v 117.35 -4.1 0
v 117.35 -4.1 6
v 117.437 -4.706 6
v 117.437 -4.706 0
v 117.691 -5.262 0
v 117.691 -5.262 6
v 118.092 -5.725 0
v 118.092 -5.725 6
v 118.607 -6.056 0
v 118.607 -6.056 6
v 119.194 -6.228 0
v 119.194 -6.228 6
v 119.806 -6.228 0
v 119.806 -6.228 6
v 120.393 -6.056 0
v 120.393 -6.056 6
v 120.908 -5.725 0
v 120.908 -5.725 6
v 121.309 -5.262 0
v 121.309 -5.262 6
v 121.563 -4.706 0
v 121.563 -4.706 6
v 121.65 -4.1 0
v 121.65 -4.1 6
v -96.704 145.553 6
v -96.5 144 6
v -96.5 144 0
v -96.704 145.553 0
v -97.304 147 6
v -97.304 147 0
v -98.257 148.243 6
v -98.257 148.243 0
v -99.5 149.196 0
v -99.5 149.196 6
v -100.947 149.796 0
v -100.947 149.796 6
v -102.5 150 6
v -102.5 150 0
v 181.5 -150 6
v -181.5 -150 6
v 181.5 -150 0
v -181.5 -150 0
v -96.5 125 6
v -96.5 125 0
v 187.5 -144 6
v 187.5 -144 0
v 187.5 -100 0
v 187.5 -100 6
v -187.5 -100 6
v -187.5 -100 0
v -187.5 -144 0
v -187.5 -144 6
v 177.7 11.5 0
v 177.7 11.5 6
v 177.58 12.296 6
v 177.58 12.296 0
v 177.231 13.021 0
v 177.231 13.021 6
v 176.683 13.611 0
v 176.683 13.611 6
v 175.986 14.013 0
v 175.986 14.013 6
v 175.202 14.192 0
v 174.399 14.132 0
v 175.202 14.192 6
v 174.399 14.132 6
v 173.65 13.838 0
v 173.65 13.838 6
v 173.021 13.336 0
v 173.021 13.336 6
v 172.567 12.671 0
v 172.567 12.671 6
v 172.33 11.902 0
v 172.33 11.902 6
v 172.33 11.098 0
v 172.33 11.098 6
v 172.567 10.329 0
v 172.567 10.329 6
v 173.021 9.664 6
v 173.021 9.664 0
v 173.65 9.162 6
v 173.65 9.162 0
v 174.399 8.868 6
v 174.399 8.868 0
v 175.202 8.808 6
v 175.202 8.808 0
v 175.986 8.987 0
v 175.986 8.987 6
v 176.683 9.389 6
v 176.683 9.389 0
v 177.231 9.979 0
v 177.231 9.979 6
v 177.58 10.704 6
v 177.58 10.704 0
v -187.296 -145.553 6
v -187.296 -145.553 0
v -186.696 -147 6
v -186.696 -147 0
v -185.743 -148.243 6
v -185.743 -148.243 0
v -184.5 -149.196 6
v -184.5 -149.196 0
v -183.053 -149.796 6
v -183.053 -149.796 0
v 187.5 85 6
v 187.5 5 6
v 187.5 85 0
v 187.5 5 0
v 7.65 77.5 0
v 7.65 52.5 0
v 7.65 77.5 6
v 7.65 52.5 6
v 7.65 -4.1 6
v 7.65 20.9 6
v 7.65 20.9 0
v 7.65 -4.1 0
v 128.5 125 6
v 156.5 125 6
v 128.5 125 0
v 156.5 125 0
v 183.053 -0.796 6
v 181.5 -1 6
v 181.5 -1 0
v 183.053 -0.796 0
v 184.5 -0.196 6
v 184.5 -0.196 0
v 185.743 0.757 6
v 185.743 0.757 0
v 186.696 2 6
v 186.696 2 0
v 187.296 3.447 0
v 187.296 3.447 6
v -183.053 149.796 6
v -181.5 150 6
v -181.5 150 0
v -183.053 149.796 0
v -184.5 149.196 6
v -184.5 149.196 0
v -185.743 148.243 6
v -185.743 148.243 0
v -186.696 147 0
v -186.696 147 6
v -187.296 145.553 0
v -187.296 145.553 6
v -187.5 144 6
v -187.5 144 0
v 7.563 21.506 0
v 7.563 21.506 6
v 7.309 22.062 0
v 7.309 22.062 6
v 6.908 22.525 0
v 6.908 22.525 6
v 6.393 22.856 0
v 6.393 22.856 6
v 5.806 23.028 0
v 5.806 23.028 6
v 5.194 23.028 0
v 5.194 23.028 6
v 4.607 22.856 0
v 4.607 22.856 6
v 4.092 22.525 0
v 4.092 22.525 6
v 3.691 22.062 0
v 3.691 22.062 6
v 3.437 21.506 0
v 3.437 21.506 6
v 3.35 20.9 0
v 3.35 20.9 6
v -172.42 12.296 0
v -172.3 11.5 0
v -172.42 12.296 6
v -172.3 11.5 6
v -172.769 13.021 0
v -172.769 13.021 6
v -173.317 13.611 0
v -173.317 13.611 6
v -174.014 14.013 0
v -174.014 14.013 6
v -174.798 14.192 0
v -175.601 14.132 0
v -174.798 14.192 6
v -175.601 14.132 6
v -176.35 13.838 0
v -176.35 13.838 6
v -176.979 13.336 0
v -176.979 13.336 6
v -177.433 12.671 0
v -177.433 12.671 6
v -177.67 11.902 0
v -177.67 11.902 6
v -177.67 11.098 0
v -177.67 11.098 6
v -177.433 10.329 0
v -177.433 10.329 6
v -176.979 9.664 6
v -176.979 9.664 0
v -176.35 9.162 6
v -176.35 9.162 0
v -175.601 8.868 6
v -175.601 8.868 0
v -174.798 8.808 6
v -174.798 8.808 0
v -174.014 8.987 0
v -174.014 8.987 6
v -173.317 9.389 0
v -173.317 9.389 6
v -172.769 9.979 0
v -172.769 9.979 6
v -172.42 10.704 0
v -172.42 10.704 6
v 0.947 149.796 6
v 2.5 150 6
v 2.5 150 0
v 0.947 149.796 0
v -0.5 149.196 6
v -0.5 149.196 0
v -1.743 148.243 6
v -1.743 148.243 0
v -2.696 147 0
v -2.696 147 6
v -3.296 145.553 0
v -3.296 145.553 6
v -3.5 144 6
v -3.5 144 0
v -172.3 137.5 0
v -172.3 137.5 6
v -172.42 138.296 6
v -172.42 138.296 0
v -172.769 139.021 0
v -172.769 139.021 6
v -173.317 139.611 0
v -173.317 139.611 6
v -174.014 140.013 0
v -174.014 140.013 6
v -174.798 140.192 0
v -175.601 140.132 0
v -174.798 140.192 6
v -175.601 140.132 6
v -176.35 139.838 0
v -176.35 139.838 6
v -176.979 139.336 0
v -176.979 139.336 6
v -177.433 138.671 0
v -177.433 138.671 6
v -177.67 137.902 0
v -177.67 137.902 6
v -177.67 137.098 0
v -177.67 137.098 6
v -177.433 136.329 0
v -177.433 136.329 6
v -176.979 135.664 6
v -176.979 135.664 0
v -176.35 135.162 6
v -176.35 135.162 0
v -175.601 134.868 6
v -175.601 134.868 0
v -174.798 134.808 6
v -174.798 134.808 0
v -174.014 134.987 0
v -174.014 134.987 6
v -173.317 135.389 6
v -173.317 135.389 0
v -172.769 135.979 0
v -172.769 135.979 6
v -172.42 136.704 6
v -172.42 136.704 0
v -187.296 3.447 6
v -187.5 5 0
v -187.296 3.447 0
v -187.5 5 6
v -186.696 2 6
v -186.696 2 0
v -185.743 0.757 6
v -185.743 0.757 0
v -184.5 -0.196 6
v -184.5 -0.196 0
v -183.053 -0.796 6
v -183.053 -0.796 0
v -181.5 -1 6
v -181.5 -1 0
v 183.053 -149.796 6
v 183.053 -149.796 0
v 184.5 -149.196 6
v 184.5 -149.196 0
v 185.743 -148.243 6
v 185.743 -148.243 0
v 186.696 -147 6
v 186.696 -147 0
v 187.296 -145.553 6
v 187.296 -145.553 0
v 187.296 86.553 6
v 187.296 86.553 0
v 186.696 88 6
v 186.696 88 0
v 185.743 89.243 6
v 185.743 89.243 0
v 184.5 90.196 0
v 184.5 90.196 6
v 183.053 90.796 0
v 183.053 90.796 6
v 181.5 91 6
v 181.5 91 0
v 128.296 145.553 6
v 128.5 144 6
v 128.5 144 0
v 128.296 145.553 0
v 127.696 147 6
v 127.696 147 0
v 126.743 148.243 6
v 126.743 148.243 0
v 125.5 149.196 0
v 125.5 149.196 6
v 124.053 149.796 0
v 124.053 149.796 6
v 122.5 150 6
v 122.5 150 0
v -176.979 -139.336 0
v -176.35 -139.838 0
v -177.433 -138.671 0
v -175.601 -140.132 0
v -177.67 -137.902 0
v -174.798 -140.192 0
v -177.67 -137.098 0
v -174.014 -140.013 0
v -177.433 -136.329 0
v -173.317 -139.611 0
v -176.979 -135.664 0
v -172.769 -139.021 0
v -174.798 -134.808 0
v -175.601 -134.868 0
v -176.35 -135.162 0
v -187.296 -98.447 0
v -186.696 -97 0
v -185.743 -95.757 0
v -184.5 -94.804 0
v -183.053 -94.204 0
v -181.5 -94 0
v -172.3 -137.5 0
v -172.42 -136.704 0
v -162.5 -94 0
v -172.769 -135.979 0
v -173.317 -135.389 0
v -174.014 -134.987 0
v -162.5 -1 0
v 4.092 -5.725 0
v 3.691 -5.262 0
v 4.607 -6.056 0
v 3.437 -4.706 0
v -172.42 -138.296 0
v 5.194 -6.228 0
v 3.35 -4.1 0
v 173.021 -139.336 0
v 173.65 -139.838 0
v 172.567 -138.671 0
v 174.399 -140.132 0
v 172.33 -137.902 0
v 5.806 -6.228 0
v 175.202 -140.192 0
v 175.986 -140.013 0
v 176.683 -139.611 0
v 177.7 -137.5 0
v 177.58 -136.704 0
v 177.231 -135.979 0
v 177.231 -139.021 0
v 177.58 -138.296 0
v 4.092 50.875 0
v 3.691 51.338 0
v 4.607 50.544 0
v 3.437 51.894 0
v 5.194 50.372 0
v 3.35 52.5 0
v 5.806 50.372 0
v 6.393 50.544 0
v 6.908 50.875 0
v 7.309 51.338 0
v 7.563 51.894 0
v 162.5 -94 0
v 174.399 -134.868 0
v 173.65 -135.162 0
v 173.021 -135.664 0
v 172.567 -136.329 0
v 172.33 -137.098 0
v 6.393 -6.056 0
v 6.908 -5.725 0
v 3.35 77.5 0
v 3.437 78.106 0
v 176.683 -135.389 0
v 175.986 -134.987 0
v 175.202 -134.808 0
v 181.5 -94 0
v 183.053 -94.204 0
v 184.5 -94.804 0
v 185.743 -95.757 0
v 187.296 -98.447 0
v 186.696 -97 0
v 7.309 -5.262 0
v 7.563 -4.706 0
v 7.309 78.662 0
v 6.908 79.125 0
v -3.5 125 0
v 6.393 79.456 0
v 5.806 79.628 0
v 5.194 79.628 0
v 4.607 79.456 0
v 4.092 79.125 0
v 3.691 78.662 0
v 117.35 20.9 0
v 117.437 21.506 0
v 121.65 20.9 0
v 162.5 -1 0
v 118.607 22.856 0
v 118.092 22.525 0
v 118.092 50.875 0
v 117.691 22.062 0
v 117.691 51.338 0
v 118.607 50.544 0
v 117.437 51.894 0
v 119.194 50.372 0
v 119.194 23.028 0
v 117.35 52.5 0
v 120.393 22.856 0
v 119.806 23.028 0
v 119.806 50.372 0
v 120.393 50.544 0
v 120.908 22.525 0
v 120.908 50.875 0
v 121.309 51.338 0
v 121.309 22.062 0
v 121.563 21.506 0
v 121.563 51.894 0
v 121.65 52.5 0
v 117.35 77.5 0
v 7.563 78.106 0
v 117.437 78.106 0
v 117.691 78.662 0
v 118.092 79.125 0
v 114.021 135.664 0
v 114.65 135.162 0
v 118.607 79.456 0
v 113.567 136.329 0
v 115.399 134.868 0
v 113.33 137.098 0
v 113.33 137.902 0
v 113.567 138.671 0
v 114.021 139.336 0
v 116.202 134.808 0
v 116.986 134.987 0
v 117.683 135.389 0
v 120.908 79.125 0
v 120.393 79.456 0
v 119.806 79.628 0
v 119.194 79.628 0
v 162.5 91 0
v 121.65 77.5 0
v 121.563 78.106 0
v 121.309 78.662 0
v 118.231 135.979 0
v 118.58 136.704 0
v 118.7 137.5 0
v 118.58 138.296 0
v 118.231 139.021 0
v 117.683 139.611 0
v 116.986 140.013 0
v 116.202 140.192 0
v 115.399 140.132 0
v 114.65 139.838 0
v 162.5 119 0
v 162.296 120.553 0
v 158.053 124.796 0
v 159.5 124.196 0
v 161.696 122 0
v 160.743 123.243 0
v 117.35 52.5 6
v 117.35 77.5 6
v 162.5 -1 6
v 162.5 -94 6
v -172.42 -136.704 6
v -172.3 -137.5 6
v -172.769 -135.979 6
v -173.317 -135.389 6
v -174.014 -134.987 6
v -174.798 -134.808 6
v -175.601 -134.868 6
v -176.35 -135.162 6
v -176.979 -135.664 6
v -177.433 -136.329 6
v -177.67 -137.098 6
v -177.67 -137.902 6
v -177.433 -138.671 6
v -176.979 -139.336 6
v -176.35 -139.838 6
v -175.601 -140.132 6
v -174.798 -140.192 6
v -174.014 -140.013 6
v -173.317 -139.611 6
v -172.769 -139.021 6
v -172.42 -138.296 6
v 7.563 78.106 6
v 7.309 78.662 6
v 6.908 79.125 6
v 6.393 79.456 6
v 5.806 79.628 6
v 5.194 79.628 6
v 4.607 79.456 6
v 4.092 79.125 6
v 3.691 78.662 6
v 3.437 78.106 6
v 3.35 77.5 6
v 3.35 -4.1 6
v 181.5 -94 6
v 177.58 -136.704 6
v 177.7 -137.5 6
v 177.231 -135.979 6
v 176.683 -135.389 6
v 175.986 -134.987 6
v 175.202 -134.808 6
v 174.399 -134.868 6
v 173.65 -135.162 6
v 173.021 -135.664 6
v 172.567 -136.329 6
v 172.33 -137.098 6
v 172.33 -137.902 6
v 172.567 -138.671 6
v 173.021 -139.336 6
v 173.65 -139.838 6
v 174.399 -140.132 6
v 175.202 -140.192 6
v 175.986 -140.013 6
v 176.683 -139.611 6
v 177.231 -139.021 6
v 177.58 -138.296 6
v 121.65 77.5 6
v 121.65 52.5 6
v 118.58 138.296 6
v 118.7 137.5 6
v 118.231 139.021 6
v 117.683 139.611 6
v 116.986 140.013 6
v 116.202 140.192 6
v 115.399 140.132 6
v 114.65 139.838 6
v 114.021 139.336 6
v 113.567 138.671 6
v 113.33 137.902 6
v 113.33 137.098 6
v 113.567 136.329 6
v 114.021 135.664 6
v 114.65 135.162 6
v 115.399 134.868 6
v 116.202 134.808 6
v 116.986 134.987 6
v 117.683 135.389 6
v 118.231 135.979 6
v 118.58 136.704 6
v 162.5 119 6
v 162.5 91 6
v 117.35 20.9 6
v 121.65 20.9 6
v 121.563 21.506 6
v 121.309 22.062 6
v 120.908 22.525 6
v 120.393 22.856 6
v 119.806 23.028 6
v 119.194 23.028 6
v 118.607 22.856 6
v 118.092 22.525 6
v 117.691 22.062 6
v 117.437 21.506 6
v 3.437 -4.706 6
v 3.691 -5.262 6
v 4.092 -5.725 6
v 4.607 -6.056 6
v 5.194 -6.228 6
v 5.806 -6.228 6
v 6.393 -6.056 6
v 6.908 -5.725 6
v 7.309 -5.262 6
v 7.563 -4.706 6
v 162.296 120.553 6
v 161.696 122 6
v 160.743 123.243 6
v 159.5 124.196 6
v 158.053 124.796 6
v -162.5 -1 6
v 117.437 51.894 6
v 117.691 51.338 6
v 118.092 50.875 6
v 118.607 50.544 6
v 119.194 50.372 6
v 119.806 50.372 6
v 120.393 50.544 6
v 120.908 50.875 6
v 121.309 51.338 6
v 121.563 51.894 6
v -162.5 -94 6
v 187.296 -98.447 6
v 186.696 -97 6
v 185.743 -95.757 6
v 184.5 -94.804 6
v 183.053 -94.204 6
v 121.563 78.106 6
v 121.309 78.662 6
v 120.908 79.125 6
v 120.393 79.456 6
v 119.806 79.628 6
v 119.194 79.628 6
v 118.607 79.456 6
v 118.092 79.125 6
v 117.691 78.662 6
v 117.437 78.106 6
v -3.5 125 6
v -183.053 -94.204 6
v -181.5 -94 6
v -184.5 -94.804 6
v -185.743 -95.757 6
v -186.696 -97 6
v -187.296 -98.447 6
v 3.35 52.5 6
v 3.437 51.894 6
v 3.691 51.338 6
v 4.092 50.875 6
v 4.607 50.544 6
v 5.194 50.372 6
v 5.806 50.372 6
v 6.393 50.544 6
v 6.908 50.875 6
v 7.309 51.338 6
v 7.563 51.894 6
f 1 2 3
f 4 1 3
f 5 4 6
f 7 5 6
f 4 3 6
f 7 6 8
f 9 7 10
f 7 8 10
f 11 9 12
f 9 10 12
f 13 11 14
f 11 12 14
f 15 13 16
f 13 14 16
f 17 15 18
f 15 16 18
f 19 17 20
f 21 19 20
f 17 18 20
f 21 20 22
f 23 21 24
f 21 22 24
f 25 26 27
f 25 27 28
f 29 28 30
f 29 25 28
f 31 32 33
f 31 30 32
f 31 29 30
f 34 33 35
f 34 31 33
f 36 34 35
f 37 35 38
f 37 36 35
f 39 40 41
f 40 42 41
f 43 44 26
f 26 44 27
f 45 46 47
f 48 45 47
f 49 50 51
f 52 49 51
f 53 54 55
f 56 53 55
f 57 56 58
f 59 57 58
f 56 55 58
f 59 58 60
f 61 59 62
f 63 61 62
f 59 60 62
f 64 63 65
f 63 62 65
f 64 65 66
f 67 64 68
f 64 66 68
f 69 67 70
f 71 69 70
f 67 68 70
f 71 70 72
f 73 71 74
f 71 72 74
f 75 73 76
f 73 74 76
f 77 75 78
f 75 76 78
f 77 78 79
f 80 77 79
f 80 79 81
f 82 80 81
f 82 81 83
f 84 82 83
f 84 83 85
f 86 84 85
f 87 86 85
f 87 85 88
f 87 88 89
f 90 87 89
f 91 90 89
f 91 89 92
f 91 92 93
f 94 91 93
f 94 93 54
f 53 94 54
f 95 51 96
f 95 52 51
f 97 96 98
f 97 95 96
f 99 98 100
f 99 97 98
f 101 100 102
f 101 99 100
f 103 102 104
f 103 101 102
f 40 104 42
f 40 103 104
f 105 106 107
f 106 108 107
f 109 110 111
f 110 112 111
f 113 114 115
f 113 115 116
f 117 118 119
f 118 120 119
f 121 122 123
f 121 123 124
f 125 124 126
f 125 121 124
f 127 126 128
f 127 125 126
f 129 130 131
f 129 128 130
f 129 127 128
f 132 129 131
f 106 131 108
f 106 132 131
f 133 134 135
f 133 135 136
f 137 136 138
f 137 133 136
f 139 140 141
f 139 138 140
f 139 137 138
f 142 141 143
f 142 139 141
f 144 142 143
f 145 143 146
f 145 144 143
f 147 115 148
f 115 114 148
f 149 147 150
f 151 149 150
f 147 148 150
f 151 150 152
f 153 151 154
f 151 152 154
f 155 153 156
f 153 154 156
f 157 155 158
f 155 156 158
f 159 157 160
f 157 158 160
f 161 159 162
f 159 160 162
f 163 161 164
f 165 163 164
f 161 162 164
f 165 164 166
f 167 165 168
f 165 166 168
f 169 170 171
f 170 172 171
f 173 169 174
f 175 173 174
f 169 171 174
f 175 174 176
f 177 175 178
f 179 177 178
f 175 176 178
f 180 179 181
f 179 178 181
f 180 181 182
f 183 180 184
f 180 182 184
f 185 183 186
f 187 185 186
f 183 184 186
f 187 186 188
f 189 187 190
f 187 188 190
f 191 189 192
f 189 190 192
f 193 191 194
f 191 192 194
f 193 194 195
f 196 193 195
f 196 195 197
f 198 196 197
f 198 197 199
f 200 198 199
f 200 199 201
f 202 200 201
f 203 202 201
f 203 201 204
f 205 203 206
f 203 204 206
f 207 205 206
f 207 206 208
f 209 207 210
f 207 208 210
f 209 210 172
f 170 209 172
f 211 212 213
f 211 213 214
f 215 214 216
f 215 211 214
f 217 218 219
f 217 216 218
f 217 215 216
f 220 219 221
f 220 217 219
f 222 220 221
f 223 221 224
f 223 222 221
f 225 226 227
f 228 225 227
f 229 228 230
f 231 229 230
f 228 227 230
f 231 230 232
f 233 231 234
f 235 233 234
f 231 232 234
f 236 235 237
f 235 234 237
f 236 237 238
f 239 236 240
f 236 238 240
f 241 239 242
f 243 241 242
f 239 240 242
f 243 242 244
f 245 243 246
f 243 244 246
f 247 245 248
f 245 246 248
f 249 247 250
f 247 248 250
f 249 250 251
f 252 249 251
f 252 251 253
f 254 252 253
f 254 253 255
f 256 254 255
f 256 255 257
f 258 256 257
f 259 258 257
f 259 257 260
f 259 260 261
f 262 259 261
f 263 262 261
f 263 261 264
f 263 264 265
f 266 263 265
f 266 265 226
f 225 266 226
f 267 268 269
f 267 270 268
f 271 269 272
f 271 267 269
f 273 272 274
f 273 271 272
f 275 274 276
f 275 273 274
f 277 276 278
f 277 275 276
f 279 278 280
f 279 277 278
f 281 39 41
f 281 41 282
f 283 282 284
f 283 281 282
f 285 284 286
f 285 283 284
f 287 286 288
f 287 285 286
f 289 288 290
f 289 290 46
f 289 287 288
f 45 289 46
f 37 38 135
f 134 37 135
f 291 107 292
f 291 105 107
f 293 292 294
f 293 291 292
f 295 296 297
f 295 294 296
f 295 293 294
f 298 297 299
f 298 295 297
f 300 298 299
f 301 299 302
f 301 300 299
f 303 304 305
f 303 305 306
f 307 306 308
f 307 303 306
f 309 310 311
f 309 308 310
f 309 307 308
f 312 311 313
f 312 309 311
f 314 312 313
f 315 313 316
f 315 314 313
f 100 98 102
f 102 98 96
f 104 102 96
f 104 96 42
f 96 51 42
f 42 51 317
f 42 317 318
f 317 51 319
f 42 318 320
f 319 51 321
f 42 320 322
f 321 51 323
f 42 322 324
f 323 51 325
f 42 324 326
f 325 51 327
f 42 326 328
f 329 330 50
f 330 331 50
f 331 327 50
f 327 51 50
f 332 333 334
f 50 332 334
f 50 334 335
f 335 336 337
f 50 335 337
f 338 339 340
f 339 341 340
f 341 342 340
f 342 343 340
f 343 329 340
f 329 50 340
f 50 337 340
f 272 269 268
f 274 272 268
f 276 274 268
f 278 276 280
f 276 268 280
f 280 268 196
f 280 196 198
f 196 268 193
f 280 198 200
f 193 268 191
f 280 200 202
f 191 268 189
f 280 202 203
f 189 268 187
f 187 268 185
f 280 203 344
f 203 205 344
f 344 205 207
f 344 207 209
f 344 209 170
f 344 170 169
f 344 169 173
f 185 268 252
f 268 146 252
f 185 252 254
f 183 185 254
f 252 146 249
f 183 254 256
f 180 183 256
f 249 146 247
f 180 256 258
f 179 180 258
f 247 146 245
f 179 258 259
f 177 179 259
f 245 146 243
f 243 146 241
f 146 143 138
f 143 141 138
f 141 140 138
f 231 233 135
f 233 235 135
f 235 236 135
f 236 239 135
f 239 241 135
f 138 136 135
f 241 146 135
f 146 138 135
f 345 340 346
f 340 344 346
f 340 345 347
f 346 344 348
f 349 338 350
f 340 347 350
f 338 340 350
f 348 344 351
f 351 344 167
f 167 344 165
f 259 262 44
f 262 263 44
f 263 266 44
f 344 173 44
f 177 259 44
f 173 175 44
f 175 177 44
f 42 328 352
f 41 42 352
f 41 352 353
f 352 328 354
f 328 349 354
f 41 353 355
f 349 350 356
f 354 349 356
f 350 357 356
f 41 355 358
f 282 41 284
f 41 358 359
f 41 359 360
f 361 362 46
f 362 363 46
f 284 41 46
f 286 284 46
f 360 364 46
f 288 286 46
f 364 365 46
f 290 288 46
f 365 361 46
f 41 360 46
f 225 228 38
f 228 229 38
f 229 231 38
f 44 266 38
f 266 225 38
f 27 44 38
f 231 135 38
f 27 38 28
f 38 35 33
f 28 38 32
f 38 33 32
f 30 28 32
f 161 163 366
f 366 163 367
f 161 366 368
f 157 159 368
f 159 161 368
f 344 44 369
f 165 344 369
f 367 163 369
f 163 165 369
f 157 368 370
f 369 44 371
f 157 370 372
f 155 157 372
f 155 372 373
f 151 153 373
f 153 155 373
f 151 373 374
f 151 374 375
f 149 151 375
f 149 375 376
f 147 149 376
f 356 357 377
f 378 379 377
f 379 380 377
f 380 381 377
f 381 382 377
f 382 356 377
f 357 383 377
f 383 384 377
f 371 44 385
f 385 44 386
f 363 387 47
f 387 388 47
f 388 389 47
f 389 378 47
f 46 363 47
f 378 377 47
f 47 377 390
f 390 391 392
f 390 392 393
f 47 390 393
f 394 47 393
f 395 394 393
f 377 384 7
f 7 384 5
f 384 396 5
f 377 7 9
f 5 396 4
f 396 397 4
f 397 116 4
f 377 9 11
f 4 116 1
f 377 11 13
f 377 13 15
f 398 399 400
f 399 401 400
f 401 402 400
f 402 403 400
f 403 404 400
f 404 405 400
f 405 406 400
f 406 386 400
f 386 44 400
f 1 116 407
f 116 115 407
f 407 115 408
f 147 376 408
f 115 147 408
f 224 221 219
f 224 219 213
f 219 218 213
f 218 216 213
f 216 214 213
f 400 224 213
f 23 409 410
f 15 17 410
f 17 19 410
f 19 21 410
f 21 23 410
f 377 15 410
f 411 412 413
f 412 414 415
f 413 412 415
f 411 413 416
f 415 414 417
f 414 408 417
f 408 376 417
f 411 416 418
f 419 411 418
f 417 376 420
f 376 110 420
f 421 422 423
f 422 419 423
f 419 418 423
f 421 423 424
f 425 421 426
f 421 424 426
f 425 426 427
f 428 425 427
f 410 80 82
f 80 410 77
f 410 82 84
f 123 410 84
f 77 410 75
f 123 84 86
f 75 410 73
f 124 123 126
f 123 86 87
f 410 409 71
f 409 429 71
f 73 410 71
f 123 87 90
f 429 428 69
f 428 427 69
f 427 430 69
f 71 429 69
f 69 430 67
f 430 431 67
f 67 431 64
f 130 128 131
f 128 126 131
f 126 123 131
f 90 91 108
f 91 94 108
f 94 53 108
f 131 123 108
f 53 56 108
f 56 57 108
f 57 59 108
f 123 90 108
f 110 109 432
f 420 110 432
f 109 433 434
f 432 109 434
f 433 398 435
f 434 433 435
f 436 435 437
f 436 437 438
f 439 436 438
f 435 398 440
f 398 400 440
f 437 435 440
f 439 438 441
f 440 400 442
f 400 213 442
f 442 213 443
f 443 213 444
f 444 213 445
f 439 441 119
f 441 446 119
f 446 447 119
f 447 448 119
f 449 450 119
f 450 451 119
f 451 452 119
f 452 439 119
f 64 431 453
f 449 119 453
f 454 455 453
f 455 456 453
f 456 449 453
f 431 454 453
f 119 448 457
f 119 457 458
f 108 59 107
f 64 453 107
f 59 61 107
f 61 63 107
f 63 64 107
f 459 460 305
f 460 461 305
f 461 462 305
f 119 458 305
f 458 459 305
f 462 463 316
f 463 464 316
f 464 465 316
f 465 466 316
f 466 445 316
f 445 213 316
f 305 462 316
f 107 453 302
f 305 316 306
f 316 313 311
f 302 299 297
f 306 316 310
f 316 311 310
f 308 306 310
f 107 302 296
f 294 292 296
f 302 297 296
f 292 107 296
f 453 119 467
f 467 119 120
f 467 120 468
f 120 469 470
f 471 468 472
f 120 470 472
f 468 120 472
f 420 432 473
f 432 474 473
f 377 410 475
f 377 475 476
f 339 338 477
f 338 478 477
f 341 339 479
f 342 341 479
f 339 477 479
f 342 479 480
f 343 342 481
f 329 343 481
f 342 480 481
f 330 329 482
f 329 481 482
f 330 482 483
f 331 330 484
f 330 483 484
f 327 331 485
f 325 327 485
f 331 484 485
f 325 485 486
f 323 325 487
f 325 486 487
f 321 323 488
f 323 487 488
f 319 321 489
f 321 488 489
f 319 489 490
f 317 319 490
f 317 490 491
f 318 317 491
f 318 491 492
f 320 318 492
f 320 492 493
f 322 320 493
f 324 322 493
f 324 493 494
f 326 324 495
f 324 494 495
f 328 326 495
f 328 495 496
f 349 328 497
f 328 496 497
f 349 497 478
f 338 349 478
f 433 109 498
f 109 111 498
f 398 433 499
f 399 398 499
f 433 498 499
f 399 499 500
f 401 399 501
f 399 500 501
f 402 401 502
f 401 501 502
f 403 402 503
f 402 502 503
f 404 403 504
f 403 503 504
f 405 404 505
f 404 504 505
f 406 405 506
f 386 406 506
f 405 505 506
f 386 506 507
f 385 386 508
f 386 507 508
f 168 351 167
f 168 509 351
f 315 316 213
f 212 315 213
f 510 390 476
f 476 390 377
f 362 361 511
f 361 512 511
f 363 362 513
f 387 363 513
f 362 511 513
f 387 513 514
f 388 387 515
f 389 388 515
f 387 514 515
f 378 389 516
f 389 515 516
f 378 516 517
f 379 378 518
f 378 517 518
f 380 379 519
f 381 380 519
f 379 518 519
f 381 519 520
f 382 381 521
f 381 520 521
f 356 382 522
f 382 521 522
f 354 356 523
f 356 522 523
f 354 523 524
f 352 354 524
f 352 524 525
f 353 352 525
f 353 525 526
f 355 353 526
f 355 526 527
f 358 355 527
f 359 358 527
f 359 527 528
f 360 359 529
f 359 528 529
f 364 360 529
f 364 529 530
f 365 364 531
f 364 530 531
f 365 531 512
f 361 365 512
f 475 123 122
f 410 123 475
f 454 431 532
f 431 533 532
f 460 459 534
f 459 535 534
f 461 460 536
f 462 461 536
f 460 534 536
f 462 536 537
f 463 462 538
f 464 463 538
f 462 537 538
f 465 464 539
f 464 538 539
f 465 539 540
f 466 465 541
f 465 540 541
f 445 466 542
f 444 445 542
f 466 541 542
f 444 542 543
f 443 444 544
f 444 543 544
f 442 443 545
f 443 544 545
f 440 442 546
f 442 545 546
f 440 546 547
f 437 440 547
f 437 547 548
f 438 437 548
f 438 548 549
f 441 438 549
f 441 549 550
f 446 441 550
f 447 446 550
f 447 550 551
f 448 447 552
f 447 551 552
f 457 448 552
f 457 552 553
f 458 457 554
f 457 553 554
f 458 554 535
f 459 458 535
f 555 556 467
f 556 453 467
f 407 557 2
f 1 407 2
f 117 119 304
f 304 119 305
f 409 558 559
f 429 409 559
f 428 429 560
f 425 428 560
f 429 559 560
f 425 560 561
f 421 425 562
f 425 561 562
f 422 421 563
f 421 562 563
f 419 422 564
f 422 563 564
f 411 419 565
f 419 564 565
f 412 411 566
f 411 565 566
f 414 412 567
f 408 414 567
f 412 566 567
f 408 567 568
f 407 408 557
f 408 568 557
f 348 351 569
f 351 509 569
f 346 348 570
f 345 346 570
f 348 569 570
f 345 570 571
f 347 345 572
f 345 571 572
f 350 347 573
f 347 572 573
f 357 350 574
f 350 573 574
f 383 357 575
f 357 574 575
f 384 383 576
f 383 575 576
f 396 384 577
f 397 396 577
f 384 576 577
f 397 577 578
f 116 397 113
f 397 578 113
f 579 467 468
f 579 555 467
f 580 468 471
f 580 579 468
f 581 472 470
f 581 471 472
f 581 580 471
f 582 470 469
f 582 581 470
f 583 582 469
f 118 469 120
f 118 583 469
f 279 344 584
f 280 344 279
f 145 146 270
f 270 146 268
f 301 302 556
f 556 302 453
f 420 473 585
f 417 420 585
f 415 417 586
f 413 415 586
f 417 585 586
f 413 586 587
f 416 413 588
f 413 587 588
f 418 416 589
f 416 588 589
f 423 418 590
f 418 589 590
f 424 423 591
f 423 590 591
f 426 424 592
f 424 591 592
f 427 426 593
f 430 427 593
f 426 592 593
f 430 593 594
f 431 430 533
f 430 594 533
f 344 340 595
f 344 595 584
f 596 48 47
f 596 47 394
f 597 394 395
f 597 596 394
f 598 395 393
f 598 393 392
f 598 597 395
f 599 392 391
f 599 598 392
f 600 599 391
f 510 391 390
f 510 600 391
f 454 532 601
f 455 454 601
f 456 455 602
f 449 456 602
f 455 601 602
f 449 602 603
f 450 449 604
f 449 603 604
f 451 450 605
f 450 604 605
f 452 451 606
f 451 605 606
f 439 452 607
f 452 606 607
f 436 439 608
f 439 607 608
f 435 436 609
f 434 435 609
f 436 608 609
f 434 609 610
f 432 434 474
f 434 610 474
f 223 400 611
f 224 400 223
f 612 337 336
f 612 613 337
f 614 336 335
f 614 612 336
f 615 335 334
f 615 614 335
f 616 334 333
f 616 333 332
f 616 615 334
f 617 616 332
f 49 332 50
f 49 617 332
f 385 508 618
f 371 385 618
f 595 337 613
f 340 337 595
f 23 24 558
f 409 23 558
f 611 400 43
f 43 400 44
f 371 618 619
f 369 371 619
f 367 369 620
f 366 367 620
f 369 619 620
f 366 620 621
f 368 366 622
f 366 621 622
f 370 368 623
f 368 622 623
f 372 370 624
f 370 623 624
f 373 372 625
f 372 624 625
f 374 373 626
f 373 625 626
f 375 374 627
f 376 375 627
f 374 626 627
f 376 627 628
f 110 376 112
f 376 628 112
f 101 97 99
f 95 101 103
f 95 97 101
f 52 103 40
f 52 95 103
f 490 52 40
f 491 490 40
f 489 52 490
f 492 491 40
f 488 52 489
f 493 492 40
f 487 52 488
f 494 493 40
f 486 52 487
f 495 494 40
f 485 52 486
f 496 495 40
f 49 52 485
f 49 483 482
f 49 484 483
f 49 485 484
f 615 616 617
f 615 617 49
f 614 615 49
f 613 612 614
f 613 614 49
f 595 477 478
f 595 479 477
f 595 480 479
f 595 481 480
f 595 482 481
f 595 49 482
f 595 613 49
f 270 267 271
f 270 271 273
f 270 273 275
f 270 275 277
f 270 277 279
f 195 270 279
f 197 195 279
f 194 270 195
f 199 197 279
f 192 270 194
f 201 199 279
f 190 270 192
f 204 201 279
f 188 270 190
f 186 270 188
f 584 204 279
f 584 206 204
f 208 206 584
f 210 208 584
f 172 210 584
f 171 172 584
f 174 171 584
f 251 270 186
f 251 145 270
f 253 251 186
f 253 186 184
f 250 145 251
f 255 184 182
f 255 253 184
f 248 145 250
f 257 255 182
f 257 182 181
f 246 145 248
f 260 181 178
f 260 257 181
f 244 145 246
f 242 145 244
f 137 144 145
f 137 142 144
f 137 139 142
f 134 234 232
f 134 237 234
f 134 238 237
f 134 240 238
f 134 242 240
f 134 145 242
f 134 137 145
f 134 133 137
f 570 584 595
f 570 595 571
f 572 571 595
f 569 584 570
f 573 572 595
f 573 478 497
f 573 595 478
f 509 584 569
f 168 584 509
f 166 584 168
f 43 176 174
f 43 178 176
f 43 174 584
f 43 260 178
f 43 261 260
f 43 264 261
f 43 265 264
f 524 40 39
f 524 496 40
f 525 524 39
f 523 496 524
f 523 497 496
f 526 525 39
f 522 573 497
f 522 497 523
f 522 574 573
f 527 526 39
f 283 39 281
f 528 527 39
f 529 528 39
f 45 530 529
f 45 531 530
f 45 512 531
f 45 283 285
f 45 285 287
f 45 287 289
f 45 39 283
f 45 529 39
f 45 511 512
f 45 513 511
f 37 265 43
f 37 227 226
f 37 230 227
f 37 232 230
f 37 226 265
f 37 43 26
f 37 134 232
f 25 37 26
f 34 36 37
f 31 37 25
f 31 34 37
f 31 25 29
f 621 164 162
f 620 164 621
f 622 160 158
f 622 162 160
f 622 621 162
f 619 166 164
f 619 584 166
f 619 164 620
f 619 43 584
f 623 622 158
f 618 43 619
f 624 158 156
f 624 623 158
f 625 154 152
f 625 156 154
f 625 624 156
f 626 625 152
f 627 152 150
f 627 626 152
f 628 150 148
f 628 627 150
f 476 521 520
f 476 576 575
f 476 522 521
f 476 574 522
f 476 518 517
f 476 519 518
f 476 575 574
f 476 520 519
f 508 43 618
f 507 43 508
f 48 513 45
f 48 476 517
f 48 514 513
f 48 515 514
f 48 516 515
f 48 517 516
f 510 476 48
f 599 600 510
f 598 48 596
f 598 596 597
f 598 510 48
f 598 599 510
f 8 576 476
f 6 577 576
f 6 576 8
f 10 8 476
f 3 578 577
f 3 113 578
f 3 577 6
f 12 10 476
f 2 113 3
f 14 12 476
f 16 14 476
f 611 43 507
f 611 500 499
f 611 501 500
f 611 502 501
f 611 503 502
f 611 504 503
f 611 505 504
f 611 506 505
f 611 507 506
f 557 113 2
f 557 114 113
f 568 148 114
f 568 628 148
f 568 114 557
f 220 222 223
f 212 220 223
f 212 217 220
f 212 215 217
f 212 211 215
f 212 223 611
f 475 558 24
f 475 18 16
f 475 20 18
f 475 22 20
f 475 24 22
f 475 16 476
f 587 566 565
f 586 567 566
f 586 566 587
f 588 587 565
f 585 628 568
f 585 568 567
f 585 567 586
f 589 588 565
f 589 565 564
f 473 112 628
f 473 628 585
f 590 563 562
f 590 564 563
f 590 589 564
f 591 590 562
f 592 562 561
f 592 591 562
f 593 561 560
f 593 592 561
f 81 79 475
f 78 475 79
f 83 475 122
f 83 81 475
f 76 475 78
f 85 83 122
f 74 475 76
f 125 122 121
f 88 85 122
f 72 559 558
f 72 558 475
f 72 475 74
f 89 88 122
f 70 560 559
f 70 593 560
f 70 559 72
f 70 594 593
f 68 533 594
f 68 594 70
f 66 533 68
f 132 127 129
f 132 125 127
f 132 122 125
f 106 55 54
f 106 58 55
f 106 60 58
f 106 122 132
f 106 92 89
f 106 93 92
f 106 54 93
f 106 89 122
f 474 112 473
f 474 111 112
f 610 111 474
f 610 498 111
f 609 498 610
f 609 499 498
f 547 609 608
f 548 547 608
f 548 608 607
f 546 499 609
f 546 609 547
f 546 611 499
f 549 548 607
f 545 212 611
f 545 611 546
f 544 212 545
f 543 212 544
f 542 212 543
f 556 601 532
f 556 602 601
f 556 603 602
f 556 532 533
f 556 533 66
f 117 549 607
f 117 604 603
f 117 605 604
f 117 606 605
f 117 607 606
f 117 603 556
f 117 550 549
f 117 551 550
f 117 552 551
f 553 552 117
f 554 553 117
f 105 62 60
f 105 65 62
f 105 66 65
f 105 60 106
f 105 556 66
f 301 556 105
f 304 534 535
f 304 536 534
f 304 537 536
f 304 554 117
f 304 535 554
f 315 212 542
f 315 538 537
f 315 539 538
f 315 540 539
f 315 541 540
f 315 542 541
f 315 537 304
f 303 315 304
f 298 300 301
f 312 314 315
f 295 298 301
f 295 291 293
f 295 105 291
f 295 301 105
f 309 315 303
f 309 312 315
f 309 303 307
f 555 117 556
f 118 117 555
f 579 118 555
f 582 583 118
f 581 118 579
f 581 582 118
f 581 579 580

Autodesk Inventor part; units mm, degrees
ref_plane "YZ Plane" through (0, 0, 0) normal (1, 0, 0) x (0, 1, 0)
ref_plane "XZ Plane" through (0, 0, 0) normal (0, 1, 0) x (-1, 0, 0)
ref_plane "XY Plane" through (0, 0, 0) normal (0, 0, 1) x (1, 0, 0)
sketch "Sketch1" plane through (0, 0, 0) normal (0, 0, 1) x (1, 0, 0)
  line L0 (-187.5, -150) -> (187.5, -150)
  line L1 (187.5, -150) -> (187.5, 150)
  line L2 (187.5, 150) -> (-187.5, 150)
  line L3 (-187.5, 150) -> (-187.5, -150)
  line L4 (-187.5, -150) -> (187.5, 150) construction
  line L5 (187.5, -150) -> (-187.5, 150) construction
  point P0 (0, 0)
  dimension "d0" = 375
  dimension "d1" = 300
extrude "Extrusion1" add sketch "Sketch1" along normal blind 6
sketch "Sketch6" plane through (0, 0, 0) normal (0, 0, -1) x (-1, 0, 0)
  line L0 (-187.5, 150) -> (-162.5, 150)
  line L1 (-162.5, 150) -> (-162.5, 125)
  line L2 (-162.5, 125) -> (-187.5, 125)
  line L3 (-187.5, 125) -> (-187.5, 150)
  line L4 (187.5, 150) -> (187.5, -150) projected
  line L5 (-187.5, 150) -> (187.5, 150) projected
  line L6 (-187.5, -150) -> (-187.5, 150) projected
  line L7 (-187.5, -35) -> (-162.5, -35)
  line L8 (-162.5, -35) -> (-162.5, -60)
  line L9 (-162.5, -60) -> (-187.5, -60)
  line L10 (-187.5, -60) -> (-187.5, -35)
  line L11 (187.5, -35) -> (162.5, -35)
  line L12 (162.5, -35) -> (162.5, -60)
  line L13 (162.5, -60) -> (187.5, -60)
  line L14 (187.5, -60) -> (187.5, -35)
  line L15 (62.5, 150) -> (37.5, 150)
  line L16 (37.5, 150) -> (37.5, 125)
  line L17 (37.5, 125) -> (62.5, 125)
  line L18 (62.5, 125) -> (62.5, 150)
  point P0 (0, 0)
  dimension "d22" = 25
  dimension "d25" = 160
  dimension "d26" = 200
extrude "Extrusion6" cut sketch "Sketch6" against normal through all
sketch "Sketch7" plane through (0, 0, 0) normal (0, 0, -1) x (-1, 0, 0)
  line L0 (-162.5, -60) -> (-187.5, -60) projected
  line L1 (-187.5, -150) -> (-187.5, -60) projected
  line L2 (187.5, -60) -> (187.5, -150) projected
  line L3 (187.5, -60) -> (162.5, -60) projected
  line L4 (62.5, 150) -> (187.5, 150) projected
  line L5 (37.5, 125) -> (37.5, 150) projected
  line L6 (-162.5, 150) -> (37.5, 150) projected
  line L7 (-162.5, 125) -> (-187.5, 125) projected
  line L8 (-187.5, -35) -> (-187.5, 125) projected
  line L9 (-162.5, 125) -> (-187.5, 125)
  line L10 (-187.5, 125) -> (-187.5, 91)
  line L11 (-187.5, 91) -> (-162.5, 91)
  line L12 (-162.5, 91) -> (-162.5, 125)
  line L13 (-162.5, 125) -> (-128.5, 125)
  line L14 (-128.5, 125) -> (-128.5, 150)
  line L15 (-128.5, 150) -> (-162.5, 150)
  line L16 (-162.5, 150) -> (-162.5, 125)
  line L17 (37.5, 125) -> (3.5, 125)
  line L18 (3.5, 125) -> (3.5, 150)
  line L19 (3.5, 150) -> (37.5, 150)
  line L20 (37.5, 150) -> (37.5, 125)
  line L21 (62.5, 125) -> (96.5, 125)
  line L22 (96.5, 125) -> (96.5, 150)
  line L23 (96.5, 150) -> (62.5, 150)
  line L24 (62.5, 150) -> (62.5, 125)
  line L25 (187.5, -35) -> (162.5, -35)
  line L26 (162.5, -35) -> (162.5, -1)
  line L27 (162.5, -1) -> (187.5, -1)
  line L28 (187.5, -1) -> (187.5, -35)
  line L29 (162.5, -60) -> (187.5, -60)
  line L30 (187.5, -60) -> (187.5, -94)
  line L31 (187.5, -94) -> (162.5, -94)
  line L32 (162.5, -94) -> (162.5, -60)
  line L33 (-162.5, -60) -> (-187.5, -60)
  line L34 (-187.5, -60) -> (-187.5, -94)
  line L35 (-187.5, -94) -> (-162.5, -94)
  line L36 (-162.5, -94) -> (-162.5, -60)
  line L37 (-162.5, -35) -> (-187.5, -35)
  line L38 (-187.5, -35) -> (-187.5, -1)
  line L39 (-187.5, -1) -> (-162.5, -1)
  line L40 (-162.5, -1) -> (-162.5, -35)
  point P0 (0, 0)
  dimension "d31" = 34
extrude "Extrusion7" cut sketch "Sketch7" against normal through all
sketch "Sketch8" plane through (0, 0, 6) normal (0, 0, 1) x (1, 0, 0)
  line L0 (187.5, -150) -> (187.5, 150) projected
  line L1 (128.5, 125) -> (128.5, 150) projected
  line L2 (187.5, 150) -> (-187.5, 150) projected
  line L3 (-187.5, -1) -> (-162.5, -1) projected
  line L4 (-162.5, -94) -> (-187.5, -94) projected
  line L5 (-187.5, -150) -> (187.5, -150) projected
  circle A0 centre (-175, 137.5) radius 2.7
  circle A1 centre (-175, 11.5) radius 2.7
  circle A2 centre (-175, -137.5) radius 2.7
  circle A3 centre (175, -137.5) radius 2.7
  circle A4 centre (175, 11.5) radius 2.7
  circle A5 centre (116, 137.5) radius 2.7
  line L6 (-175, -137.5) -> (-175, -94) construction
  point P0 (187.5, -1)
  point P1 (187.5, 91)
  point P2 (-96.5, 150)
  point P3 (0, 0)
  dimension "d32" = 12.5
  dimension "d33" = 12.5
  dimension "d34" = 12.5
  dimension "d35" = 12.5
  dimension "d36" = 12.5
  dimension "d37" = 5.4
extrude "Extrusion8" cut sketch "Sketch8" against normal blind 10
sketch "Sketch9" plane through (0, 0, 6) normal (0, 0, 1) x (1, 0, 0)
  line L0 (187.5, -150) -> (187.5, 150) projected
  line L1 (187.5, 150) -> (-187.5, 150) projected
  line L2 (-3.5, 125) -> (-96.5, 125) projected
  line L3 (187.5, -94) -> (162.5, -94) projected
  line L4 (5.5, 77.5) -> (5.5, 52.5) construction
  line L5 (3.35, 77.5) -> (3.35, 52.5)
  line L6 (7.65, 52.5) -> (7.65, 77.5)
  arc A0 (7.65, 77.5) -> (3.35, 77.5) centre (5.5, 77.5) ccw
  arc A1 (3.35, 52.5) -> (7.65, 52.5) centre (5.5, 52.5) ccw
  line L7 (5.5, -4.1) -> (5.5, 20.9) construction
  line L8 (3.35, -4.1) -> (3.35, 20.9)
  line L9 (7.65, 20.9) -> (7.65, -4.1)
  arc A2 (3.35, -4.1) -> (7.65, -4.1) centre (5.5, -4.1) ccw
  arc A3 (7.65, 20.9) -> (3.35, 20.9) centre (5.5, 20.9) ccw
  line L10 (119.5, 77.5) -> (119.5, 52.5) construction
  line L11 (117.35, 77.5) -> (117.35, 52.5)
  line L12 (121.65, 52.5) -> (121.65, 77.5)
  arc A4 (121.65, 77.5) -> (117.35, 77.5) centre (119.5, 77.5) ccw
  arc A5 (117.35, 52.5) -> (121.65, 52.5) centre (119.5, 52.5) ccw
  line L13 (119.5, 20.9) -> (119.5, -4.1) construction
  line L14 (117.35, 20.9) -> (117.35, -4.1)
  line L15 (121.65, -4.1) -> (121.65, 20.9)
  arc A6 (121.65, 20.9) -> (117.35, 20.9) centre (119.5, 20.9) ccw
  arc A7 (117.35, -4.1) -> (121.65, -4.1) centre (119.5, -4.1) ccw
  line L16 (-50, 125) -> (-50, -47.5) construction
  line L17 (-50, -47.5) -> (175, -47.5) construction
  line L18 (175, -47.5) -> (175, -94) construction
  line L19 (5.5, 8.4) -> (119.5, 8.4) construction
  line L20 (62.5, 8.4) -> (62.5, -47.5) construction
  point P0 (187.5, -1)
  point P1 (187.5, 91)
  point P2 (128.5, 150)
  point P3 (-3.5, 150)
  point P4 (0, 0)
  point P5 (5.5, 65)
  point P6 (119.5, 65)
  point P7 (-37.5, 125)
  point P8 (-62.5, 125)
  dimension "d40" = 114
  dimension "d41" = 2.15
  dimension "d42" = 56.6
  dimension "d43" = 25
  dimension "d44" = 85
extrude "Extrusion9" cut sketch "Sketch9" against normal blind 10
fillet "Fillet3" radius 6 12 edges at (187.5, -150, 3) (187.5, -94, 3) (187.5, -1, 3) (187.5, 91, 3) (162.5, 125, 3) (128.5, 150, 3) (-3.5, 150, 3) (-96.5, 150, 3) (-187.5, 150, 3) (-187.5, -94, 3) (-187.5, -150, 3) (-187.5, -1, 3)
equation "\"d33\" = d32"
equation "\"d34\" = d32"
equation "\"d35\" = d33"
equation "\"d36\" = d32"
properties part number "ProjectorPlateFront"
